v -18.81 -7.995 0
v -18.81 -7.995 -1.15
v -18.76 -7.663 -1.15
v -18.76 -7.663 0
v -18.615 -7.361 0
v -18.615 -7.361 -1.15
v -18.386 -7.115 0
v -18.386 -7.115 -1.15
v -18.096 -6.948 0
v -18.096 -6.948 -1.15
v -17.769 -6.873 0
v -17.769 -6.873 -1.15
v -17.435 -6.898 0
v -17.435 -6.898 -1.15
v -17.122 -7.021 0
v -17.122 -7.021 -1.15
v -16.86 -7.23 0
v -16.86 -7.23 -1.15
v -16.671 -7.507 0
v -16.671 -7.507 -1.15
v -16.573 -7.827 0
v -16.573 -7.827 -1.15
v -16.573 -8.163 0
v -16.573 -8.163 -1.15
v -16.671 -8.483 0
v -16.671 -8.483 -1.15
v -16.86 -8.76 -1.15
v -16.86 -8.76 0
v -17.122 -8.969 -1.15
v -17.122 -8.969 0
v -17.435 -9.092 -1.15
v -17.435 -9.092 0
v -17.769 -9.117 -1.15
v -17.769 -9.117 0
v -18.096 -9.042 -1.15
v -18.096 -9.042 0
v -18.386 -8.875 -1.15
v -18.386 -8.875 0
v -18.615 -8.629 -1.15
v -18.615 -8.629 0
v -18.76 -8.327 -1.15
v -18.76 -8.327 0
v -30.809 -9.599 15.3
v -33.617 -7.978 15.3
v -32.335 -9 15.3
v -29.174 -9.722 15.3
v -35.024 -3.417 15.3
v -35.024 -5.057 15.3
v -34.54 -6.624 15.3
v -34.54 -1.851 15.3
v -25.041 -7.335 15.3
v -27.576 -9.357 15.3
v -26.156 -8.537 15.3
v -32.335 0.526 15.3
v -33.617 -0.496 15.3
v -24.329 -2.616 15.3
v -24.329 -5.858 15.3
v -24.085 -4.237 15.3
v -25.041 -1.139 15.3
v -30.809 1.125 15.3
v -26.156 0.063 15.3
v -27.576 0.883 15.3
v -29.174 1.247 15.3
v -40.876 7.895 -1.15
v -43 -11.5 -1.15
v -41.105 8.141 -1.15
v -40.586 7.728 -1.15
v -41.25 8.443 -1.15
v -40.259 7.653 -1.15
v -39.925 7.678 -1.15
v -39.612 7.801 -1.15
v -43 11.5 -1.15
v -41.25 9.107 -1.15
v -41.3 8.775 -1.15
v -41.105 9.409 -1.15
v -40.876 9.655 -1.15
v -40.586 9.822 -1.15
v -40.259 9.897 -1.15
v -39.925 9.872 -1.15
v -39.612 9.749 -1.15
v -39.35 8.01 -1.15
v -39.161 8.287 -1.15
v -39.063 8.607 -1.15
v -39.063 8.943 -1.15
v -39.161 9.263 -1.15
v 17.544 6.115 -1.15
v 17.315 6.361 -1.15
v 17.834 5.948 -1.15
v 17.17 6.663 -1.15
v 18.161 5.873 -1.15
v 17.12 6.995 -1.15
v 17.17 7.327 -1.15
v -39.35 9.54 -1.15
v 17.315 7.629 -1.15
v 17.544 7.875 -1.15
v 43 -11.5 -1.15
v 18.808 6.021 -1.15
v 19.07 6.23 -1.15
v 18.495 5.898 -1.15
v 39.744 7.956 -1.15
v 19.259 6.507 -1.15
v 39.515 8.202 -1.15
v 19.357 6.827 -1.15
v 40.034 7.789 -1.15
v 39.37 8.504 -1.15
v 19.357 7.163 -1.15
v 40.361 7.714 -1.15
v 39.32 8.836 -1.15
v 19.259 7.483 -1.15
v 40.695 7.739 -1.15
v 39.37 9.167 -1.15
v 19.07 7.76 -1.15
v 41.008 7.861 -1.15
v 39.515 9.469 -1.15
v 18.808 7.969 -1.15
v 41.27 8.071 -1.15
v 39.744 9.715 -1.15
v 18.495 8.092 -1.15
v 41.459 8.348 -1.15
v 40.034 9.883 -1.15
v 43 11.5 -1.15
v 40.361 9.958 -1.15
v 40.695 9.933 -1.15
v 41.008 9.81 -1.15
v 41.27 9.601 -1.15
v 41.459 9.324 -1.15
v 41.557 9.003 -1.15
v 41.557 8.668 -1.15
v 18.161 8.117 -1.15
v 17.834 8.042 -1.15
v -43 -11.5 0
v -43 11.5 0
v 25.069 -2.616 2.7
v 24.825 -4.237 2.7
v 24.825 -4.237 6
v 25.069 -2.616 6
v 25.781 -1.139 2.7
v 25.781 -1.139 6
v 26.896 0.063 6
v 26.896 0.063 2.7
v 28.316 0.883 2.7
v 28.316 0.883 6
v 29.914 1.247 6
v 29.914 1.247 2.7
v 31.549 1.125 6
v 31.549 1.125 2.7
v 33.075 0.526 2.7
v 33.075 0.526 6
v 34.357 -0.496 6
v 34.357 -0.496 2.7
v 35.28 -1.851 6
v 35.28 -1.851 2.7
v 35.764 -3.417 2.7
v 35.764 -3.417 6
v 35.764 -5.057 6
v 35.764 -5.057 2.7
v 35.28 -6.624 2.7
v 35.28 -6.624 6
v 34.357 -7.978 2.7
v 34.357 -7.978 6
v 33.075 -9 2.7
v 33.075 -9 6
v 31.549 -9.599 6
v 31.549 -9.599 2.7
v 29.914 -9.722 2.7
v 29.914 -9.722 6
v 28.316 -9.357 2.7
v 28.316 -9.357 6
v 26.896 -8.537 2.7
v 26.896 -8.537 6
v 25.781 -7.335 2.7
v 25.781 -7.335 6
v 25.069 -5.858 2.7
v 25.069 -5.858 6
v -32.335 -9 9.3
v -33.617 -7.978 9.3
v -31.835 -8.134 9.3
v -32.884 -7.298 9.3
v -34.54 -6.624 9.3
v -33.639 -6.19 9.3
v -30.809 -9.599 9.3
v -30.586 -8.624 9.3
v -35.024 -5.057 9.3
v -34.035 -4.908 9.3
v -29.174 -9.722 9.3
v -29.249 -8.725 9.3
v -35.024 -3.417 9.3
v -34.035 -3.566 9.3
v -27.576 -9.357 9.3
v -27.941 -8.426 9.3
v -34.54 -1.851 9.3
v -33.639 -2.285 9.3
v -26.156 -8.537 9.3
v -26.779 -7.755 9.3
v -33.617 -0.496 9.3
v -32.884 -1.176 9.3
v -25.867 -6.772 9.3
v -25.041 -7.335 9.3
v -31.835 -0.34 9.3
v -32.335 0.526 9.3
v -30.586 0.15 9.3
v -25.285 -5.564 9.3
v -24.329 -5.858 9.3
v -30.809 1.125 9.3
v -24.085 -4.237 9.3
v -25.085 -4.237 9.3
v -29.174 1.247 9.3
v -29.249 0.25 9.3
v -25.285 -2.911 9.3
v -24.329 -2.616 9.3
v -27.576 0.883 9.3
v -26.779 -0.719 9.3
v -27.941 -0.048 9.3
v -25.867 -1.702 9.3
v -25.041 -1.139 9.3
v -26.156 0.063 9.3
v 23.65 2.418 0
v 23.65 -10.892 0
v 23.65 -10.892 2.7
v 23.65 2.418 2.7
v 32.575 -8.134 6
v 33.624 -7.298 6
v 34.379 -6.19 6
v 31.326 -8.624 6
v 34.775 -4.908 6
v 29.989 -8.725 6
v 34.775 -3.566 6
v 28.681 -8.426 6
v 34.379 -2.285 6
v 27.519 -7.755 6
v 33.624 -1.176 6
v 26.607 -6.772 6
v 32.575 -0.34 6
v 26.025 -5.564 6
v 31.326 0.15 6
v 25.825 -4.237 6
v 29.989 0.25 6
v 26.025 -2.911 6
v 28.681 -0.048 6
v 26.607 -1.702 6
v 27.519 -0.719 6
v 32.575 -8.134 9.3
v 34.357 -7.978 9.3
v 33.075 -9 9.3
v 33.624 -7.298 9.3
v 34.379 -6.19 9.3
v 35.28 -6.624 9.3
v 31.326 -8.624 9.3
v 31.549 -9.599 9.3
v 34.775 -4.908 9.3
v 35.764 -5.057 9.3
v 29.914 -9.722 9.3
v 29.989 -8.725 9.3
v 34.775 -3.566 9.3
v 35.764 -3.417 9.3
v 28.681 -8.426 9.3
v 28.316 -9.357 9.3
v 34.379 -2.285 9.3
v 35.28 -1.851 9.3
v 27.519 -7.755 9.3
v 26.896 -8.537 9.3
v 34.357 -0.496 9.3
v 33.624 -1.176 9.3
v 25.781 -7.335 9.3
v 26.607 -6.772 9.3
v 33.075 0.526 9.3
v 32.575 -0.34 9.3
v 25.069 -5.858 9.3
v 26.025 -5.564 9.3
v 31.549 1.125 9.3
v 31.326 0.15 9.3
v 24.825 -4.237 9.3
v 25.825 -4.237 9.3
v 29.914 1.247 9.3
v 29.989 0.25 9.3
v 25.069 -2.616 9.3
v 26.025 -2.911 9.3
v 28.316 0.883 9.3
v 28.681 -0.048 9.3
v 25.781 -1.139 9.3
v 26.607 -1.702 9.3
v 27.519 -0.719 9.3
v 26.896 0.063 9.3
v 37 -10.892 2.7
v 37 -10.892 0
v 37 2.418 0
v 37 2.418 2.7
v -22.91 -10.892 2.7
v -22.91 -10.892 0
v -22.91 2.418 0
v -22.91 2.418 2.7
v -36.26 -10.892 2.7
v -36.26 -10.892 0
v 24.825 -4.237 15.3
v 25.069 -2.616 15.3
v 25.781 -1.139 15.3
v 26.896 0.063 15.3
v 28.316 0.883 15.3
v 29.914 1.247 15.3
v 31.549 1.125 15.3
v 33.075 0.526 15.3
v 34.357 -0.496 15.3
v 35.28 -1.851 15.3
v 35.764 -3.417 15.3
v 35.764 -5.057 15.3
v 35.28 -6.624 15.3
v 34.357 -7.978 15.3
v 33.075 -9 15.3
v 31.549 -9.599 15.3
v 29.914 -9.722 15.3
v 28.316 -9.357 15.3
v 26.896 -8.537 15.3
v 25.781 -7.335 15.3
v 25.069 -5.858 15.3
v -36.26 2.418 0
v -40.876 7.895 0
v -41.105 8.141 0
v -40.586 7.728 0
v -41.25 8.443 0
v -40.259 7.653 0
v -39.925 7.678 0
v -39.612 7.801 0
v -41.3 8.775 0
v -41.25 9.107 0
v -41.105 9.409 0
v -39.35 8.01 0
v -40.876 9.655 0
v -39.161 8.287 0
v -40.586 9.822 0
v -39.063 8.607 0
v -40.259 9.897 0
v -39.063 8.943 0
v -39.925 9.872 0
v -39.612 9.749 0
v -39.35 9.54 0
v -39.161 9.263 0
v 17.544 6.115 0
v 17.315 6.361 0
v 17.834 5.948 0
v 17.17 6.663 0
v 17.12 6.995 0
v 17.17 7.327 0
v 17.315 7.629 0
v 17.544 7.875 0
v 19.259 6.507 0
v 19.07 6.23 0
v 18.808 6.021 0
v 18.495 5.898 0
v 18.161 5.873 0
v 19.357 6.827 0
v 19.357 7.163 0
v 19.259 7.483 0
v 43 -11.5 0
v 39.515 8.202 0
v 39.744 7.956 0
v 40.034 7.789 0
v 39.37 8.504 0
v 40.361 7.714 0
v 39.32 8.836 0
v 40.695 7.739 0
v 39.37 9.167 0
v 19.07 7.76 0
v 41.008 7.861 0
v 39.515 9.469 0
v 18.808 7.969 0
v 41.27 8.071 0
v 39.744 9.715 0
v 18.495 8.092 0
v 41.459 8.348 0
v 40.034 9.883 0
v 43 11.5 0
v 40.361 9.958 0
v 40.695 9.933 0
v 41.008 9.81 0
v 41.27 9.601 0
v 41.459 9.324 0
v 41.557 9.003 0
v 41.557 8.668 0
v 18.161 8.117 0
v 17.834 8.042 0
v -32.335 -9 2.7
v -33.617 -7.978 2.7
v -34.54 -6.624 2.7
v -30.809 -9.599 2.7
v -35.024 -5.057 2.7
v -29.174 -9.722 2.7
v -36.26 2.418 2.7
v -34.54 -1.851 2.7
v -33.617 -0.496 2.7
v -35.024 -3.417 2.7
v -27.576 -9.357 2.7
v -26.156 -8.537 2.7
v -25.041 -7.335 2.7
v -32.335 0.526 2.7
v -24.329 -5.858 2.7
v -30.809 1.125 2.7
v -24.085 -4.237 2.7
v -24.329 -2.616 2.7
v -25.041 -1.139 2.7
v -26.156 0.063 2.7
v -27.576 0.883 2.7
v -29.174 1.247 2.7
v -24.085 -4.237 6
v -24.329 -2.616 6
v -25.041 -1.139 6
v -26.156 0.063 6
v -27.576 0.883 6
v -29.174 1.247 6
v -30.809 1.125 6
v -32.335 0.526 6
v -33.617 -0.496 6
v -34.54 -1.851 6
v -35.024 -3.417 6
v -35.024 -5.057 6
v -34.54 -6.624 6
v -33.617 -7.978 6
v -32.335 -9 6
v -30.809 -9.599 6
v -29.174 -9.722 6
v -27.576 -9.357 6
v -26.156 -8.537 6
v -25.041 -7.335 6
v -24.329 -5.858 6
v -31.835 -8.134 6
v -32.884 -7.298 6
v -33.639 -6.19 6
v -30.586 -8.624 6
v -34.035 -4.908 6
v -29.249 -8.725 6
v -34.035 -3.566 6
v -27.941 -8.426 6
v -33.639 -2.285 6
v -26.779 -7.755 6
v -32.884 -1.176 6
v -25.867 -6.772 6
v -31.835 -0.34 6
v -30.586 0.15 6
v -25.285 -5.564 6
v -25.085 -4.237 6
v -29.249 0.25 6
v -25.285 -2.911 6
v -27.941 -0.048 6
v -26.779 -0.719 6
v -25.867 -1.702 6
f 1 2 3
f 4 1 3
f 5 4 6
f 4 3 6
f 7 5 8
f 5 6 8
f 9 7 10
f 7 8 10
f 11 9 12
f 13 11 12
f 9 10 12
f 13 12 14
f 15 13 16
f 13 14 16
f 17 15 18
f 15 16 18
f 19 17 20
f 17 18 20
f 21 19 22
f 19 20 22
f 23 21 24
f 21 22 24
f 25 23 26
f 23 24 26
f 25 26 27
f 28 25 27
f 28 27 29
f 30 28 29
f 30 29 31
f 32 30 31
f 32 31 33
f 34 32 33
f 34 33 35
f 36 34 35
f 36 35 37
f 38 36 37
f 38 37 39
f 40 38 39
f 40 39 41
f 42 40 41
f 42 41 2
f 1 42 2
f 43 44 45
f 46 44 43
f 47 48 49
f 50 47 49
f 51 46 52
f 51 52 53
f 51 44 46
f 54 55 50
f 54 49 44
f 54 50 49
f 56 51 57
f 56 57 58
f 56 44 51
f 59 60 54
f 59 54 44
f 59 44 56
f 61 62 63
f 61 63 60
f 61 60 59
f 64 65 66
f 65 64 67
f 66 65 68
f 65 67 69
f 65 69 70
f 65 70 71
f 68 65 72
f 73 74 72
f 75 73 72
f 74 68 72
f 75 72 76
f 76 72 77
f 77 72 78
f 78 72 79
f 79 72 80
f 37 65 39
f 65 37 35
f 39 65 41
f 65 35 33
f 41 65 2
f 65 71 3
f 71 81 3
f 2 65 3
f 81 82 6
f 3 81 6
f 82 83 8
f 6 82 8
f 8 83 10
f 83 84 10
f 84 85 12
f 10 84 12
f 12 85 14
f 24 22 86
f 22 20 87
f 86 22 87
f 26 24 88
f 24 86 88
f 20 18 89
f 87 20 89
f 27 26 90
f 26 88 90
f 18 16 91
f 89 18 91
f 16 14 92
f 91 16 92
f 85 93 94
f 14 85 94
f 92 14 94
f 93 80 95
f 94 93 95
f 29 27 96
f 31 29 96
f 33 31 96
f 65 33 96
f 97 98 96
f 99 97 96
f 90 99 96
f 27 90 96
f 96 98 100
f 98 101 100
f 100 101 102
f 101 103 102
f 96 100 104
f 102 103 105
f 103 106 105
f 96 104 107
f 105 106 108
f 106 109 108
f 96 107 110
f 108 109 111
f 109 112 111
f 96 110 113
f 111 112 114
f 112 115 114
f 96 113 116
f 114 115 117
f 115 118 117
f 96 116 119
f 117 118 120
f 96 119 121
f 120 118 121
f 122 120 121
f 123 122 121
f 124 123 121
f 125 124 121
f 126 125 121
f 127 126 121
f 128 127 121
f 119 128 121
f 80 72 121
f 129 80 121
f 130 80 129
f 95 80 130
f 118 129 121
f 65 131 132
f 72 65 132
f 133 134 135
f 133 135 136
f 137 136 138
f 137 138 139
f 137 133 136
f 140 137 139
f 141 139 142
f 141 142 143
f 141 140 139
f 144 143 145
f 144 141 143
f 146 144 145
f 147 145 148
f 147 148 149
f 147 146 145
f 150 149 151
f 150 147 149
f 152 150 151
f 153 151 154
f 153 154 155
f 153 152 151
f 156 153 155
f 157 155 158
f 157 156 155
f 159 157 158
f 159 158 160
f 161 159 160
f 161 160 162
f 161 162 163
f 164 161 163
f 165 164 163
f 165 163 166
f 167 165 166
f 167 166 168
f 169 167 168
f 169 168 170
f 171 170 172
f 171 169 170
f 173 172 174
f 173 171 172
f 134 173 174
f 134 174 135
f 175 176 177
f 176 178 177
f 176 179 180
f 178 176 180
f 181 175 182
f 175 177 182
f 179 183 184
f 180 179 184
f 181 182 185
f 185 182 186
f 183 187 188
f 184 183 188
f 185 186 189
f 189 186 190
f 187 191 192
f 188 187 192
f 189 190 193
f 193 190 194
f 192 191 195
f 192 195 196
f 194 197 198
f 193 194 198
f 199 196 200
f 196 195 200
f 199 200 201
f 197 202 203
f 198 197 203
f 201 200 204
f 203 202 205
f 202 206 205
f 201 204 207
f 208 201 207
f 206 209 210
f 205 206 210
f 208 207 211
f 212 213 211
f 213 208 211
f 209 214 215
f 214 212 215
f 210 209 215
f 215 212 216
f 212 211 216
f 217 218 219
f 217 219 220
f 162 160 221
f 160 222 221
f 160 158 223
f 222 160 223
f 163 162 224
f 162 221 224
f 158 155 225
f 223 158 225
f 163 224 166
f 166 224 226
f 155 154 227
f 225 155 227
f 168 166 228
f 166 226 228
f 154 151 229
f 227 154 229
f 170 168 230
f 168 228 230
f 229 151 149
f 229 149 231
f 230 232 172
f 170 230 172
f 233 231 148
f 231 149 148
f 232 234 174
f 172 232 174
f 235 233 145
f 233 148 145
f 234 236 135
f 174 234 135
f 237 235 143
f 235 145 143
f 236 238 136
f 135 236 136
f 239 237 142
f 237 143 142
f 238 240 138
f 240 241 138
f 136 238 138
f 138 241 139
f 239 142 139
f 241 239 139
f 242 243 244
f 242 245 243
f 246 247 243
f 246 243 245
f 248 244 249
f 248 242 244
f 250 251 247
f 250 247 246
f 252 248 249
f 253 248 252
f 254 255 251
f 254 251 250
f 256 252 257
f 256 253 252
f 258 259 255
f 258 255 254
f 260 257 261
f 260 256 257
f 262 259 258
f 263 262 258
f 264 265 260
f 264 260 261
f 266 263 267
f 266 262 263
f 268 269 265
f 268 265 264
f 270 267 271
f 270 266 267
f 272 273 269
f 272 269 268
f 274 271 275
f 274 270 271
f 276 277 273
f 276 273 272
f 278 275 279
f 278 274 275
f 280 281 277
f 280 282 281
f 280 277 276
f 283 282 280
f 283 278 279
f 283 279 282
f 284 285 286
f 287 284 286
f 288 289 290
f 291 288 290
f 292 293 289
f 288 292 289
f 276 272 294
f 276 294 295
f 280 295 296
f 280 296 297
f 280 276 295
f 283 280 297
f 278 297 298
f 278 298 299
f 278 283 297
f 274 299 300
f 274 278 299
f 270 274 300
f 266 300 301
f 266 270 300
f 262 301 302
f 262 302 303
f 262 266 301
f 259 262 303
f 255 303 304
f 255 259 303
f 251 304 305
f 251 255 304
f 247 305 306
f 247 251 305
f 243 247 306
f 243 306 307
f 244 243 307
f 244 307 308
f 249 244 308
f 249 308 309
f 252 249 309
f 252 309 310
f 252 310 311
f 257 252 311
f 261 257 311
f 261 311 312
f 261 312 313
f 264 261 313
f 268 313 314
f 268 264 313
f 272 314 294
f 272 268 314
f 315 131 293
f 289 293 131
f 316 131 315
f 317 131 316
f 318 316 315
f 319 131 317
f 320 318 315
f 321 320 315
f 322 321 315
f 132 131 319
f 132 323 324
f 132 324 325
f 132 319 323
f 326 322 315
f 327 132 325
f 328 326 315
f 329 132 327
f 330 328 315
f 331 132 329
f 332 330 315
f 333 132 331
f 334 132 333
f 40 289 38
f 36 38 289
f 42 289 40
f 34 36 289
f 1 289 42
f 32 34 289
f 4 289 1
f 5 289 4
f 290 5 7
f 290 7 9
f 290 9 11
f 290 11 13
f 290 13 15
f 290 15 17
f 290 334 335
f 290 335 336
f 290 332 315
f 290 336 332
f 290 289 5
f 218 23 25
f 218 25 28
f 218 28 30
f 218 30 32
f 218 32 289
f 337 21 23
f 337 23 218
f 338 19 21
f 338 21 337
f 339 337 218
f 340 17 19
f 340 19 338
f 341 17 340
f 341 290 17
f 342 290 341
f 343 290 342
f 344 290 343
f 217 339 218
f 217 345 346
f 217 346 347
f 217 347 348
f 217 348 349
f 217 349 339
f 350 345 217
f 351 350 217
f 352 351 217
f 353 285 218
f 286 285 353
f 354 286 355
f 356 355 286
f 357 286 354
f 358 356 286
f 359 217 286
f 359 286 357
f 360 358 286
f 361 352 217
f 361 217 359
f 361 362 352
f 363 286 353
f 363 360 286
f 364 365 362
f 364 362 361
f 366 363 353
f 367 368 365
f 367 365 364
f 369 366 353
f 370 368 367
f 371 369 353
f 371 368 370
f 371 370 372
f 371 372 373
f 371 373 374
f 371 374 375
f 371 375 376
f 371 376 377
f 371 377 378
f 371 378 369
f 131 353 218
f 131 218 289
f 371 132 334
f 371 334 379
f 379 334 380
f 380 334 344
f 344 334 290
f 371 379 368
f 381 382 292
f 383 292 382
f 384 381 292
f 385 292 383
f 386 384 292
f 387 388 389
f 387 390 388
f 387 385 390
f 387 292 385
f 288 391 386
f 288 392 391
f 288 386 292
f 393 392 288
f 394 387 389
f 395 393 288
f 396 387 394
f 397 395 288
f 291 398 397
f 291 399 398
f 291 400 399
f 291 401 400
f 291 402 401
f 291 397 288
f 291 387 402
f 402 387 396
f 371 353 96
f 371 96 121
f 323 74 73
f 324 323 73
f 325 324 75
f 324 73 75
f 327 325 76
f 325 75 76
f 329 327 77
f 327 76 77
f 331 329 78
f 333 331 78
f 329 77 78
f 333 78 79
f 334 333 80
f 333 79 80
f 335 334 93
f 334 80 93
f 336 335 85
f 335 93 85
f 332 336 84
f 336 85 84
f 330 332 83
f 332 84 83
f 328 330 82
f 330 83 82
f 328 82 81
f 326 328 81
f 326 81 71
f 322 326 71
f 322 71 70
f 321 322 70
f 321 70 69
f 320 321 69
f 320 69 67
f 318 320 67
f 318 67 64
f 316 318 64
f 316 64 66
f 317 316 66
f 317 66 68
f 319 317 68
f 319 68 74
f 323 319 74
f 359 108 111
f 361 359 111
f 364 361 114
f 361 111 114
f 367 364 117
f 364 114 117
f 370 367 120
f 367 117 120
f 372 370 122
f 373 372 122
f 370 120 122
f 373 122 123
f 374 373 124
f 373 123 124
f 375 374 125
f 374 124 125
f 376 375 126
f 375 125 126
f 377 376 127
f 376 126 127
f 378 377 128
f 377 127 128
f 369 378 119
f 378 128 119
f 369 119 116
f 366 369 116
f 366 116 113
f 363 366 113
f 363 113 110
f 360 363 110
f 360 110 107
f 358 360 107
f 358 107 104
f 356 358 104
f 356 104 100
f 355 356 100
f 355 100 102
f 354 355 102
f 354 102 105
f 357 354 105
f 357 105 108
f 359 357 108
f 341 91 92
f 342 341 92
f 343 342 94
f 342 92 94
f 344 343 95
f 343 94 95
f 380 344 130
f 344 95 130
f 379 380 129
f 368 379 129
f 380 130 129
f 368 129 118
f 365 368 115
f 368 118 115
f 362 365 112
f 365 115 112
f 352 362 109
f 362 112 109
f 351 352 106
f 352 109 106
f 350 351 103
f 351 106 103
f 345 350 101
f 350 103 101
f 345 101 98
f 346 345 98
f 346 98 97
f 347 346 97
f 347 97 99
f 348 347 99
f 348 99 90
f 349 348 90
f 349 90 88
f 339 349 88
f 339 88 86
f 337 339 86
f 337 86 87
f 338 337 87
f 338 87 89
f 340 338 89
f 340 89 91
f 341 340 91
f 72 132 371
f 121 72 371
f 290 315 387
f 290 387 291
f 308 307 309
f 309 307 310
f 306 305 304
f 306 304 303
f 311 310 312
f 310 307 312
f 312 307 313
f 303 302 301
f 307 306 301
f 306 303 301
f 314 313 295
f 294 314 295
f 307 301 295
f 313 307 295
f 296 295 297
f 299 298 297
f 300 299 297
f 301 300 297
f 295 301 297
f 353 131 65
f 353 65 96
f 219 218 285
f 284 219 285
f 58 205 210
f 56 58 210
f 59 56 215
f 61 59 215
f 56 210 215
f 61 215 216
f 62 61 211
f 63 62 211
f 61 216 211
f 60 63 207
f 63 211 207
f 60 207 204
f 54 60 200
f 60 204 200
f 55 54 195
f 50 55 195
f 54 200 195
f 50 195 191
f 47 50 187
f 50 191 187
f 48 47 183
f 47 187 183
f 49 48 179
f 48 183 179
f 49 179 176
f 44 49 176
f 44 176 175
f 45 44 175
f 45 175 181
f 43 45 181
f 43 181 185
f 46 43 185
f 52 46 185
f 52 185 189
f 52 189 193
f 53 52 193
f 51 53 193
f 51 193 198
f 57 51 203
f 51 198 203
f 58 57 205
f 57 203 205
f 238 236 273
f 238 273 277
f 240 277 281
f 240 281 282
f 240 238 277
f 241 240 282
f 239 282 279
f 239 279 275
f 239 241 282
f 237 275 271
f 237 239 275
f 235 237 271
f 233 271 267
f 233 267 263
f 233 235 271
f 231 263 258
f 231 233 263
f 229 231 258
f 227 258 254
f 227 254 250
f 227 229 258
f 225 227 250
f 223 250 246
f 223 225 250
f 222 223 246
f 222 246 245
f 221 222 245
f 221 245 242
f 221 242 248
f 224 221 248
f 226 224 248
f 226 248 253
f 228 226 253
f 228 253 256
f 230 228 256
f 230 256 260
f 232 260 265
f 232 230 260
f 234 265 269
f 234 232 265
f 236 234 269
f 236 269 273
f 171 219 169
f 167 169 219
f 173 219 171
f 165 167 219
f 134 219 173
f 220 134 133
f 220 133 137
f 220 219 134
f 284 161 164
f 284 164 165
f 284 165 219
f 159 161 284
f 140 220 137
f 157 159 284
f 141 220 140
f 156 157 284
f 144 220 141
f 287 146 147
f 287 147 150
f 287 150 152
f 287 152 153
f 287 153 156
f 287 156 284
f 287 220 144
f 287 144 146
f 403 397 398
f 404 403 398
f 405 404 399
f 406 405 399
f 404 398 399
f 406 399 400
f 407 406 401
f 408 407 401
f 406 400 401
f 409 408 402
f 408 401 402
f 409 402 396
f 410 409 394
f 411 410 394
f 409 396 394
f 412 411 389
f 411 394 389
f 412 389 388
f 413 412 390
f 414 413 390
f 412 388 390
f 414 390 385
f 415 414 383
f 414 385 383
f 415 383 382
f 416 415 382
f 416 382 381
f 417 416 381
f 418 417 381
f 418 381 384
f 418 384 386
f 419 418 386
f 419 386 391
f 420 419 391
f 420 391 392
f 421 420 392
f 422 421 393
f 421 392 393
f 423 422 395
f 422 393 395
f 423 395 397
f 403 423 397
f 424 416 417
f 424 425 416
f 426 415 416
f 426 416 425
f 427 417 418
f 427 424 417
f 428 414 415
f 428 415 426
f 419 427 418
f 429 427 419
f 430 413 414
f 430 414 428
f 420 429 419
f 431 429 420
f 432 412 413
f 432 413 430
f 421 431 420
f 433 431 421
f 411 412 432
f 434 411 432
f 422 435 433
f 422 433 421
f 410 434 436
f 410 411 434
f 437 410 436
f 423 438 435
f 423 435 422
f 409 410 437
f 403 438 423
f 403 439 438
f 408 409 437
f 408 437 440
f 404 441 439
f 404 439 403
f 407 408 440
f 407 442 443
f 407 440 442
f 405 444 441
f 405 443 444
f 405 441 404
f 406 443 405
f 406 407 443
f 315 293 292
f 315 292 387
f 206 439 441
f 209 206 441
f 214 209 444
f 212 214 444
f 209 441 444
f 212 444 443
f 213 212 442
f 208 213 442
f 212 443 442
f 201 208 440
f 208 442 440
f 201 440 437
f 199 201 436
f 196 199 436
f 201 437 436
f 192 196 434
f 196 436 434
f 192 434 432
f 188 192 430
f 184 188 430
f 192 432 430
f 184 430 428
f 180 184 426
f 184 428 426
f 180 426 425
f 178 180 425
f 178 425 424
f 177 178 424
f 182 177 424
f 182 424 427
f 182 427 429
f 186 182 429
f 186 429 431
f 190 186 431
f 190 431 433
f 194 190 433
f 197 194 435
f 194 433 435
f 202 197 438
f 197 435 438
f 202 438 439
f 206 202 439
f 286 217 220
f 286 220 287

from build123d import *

# Parameters (mm, degrees)
SKETCH1_W           = 86
SKETCH1_H           = 23
BOSS_EXTRUDE1_DEPTH = 1.15
SKETCH2_W           = 13.35
SKETCH2_H           = 13.31
BOSS_EXTRUDE2_DEPTH = 2.7
SKETCH3_R           = 5.5
BOSS_EXTRUDE3_DEPTH = 3.3
SKETCH5_R           = 4.5
BOSS_EXTRUDE4_DEPTH = 3.3
SKETCH6_R           = 5.5
BOSS_EXTRUDE5_DEPTH = 6
SKETCH7_R           = 1.125
CUT_EXTRUDE1_DEPTH  = 3


with BuildPart() as part:
    # Sketch1 → Boss-Extrude1 (new body)
    with BuildSketch(Plane.XY):
        Rectangle(SKETCH1_W, SKETCH1_H)
    extrude(amount=-BOSS_EXTRUDE1_DEPTH)

    # Sketch2 → Boss-Extrude2 (add)
    with BuildSketch(Plane.XY):
        with Locations((-29.585, -4.237161914)):
            Rectangle(SKETCH2_W, SKETCH2_H)
        with Locations((30.325, -4.237161914)):
            Rectangle(SKETCH2_W, SKETCH2_H)
    extrude(amount=BOSS_EXTRUDE2_DEPTH)

    # Sketch3 → Boss-Extrude3 (add)
    with BuildSketch(Plane.XY.offset(2.7)):
        with Locations((-29.585, -4.237161914)):
            Circle(SKETCH3_R)
    boss_extrude3 = extrude(amount=BOSS_EXTRUDE3_DEPTH)

    # Sketch5 → Boss-Extrude4 (add)
    with BuildSketch(Plane.XY.offset(6)):
        with Locations((-29.585, -4.237161914)):
            Circle(SKETCH5_R)
    boss_extrude4 = extrude(amount=BOSS_EXTRUDE4_DEPTH)

    # Sketch6 → Boss-Extrude5 (add)
    with BuildSketch(Plane.XY.offset(9.3)):
        with Locations((-29.585, -4.237161914)):
            Circle(SKETCH6_R)
    boss_extrude5 = extrude(amount=BOSS_EXTRUDE5_DEPTH)

    # Mirror1: Boss-Extrude3, Boss-Extrude4, Boss-Extrude5 across plane
    add(boss_extrude3.mirror(Plane(origin=(0.37, 0, 0), x_dir=(0, 0, 1), z_dir=(1, 0, 0))))
    add(boss_extrude4.mirror(Plane(origin=(0.37, 0, 0), x_dir=(0, 0, 1), z_dir=(1, 0, 0))))
    add(boss_extrude5.mirror(Plane(origin=(0.37, 0, 0), x_dir=(0, 0, 1), z_dir=(1, 0, 0))))

    # Sketch7 → Cut-Extrude1 (cut)
    with BuildSketch(Plane(origin=(0, 0, -1.15), x_dir=(-1, 0, 0), z_dir=(0, 0, -1))):
        with Locations((40.175, 8.775)):
            Circle(SKETCH7_R)
        with Locations((17.685, -7.995)):
            Circle(SKETCH7_R)
        with Locations((-18.245, 6.995)):
            Circle(SKETCH7_R)
        with Locations((-40.445, 8.835764466)):
            Circle(SKETCH7_R)
    extrude(amount=-CUT_EXTRUDE1_DEPTH, mode=Mode.SUBTRACT)


solid = part.part
